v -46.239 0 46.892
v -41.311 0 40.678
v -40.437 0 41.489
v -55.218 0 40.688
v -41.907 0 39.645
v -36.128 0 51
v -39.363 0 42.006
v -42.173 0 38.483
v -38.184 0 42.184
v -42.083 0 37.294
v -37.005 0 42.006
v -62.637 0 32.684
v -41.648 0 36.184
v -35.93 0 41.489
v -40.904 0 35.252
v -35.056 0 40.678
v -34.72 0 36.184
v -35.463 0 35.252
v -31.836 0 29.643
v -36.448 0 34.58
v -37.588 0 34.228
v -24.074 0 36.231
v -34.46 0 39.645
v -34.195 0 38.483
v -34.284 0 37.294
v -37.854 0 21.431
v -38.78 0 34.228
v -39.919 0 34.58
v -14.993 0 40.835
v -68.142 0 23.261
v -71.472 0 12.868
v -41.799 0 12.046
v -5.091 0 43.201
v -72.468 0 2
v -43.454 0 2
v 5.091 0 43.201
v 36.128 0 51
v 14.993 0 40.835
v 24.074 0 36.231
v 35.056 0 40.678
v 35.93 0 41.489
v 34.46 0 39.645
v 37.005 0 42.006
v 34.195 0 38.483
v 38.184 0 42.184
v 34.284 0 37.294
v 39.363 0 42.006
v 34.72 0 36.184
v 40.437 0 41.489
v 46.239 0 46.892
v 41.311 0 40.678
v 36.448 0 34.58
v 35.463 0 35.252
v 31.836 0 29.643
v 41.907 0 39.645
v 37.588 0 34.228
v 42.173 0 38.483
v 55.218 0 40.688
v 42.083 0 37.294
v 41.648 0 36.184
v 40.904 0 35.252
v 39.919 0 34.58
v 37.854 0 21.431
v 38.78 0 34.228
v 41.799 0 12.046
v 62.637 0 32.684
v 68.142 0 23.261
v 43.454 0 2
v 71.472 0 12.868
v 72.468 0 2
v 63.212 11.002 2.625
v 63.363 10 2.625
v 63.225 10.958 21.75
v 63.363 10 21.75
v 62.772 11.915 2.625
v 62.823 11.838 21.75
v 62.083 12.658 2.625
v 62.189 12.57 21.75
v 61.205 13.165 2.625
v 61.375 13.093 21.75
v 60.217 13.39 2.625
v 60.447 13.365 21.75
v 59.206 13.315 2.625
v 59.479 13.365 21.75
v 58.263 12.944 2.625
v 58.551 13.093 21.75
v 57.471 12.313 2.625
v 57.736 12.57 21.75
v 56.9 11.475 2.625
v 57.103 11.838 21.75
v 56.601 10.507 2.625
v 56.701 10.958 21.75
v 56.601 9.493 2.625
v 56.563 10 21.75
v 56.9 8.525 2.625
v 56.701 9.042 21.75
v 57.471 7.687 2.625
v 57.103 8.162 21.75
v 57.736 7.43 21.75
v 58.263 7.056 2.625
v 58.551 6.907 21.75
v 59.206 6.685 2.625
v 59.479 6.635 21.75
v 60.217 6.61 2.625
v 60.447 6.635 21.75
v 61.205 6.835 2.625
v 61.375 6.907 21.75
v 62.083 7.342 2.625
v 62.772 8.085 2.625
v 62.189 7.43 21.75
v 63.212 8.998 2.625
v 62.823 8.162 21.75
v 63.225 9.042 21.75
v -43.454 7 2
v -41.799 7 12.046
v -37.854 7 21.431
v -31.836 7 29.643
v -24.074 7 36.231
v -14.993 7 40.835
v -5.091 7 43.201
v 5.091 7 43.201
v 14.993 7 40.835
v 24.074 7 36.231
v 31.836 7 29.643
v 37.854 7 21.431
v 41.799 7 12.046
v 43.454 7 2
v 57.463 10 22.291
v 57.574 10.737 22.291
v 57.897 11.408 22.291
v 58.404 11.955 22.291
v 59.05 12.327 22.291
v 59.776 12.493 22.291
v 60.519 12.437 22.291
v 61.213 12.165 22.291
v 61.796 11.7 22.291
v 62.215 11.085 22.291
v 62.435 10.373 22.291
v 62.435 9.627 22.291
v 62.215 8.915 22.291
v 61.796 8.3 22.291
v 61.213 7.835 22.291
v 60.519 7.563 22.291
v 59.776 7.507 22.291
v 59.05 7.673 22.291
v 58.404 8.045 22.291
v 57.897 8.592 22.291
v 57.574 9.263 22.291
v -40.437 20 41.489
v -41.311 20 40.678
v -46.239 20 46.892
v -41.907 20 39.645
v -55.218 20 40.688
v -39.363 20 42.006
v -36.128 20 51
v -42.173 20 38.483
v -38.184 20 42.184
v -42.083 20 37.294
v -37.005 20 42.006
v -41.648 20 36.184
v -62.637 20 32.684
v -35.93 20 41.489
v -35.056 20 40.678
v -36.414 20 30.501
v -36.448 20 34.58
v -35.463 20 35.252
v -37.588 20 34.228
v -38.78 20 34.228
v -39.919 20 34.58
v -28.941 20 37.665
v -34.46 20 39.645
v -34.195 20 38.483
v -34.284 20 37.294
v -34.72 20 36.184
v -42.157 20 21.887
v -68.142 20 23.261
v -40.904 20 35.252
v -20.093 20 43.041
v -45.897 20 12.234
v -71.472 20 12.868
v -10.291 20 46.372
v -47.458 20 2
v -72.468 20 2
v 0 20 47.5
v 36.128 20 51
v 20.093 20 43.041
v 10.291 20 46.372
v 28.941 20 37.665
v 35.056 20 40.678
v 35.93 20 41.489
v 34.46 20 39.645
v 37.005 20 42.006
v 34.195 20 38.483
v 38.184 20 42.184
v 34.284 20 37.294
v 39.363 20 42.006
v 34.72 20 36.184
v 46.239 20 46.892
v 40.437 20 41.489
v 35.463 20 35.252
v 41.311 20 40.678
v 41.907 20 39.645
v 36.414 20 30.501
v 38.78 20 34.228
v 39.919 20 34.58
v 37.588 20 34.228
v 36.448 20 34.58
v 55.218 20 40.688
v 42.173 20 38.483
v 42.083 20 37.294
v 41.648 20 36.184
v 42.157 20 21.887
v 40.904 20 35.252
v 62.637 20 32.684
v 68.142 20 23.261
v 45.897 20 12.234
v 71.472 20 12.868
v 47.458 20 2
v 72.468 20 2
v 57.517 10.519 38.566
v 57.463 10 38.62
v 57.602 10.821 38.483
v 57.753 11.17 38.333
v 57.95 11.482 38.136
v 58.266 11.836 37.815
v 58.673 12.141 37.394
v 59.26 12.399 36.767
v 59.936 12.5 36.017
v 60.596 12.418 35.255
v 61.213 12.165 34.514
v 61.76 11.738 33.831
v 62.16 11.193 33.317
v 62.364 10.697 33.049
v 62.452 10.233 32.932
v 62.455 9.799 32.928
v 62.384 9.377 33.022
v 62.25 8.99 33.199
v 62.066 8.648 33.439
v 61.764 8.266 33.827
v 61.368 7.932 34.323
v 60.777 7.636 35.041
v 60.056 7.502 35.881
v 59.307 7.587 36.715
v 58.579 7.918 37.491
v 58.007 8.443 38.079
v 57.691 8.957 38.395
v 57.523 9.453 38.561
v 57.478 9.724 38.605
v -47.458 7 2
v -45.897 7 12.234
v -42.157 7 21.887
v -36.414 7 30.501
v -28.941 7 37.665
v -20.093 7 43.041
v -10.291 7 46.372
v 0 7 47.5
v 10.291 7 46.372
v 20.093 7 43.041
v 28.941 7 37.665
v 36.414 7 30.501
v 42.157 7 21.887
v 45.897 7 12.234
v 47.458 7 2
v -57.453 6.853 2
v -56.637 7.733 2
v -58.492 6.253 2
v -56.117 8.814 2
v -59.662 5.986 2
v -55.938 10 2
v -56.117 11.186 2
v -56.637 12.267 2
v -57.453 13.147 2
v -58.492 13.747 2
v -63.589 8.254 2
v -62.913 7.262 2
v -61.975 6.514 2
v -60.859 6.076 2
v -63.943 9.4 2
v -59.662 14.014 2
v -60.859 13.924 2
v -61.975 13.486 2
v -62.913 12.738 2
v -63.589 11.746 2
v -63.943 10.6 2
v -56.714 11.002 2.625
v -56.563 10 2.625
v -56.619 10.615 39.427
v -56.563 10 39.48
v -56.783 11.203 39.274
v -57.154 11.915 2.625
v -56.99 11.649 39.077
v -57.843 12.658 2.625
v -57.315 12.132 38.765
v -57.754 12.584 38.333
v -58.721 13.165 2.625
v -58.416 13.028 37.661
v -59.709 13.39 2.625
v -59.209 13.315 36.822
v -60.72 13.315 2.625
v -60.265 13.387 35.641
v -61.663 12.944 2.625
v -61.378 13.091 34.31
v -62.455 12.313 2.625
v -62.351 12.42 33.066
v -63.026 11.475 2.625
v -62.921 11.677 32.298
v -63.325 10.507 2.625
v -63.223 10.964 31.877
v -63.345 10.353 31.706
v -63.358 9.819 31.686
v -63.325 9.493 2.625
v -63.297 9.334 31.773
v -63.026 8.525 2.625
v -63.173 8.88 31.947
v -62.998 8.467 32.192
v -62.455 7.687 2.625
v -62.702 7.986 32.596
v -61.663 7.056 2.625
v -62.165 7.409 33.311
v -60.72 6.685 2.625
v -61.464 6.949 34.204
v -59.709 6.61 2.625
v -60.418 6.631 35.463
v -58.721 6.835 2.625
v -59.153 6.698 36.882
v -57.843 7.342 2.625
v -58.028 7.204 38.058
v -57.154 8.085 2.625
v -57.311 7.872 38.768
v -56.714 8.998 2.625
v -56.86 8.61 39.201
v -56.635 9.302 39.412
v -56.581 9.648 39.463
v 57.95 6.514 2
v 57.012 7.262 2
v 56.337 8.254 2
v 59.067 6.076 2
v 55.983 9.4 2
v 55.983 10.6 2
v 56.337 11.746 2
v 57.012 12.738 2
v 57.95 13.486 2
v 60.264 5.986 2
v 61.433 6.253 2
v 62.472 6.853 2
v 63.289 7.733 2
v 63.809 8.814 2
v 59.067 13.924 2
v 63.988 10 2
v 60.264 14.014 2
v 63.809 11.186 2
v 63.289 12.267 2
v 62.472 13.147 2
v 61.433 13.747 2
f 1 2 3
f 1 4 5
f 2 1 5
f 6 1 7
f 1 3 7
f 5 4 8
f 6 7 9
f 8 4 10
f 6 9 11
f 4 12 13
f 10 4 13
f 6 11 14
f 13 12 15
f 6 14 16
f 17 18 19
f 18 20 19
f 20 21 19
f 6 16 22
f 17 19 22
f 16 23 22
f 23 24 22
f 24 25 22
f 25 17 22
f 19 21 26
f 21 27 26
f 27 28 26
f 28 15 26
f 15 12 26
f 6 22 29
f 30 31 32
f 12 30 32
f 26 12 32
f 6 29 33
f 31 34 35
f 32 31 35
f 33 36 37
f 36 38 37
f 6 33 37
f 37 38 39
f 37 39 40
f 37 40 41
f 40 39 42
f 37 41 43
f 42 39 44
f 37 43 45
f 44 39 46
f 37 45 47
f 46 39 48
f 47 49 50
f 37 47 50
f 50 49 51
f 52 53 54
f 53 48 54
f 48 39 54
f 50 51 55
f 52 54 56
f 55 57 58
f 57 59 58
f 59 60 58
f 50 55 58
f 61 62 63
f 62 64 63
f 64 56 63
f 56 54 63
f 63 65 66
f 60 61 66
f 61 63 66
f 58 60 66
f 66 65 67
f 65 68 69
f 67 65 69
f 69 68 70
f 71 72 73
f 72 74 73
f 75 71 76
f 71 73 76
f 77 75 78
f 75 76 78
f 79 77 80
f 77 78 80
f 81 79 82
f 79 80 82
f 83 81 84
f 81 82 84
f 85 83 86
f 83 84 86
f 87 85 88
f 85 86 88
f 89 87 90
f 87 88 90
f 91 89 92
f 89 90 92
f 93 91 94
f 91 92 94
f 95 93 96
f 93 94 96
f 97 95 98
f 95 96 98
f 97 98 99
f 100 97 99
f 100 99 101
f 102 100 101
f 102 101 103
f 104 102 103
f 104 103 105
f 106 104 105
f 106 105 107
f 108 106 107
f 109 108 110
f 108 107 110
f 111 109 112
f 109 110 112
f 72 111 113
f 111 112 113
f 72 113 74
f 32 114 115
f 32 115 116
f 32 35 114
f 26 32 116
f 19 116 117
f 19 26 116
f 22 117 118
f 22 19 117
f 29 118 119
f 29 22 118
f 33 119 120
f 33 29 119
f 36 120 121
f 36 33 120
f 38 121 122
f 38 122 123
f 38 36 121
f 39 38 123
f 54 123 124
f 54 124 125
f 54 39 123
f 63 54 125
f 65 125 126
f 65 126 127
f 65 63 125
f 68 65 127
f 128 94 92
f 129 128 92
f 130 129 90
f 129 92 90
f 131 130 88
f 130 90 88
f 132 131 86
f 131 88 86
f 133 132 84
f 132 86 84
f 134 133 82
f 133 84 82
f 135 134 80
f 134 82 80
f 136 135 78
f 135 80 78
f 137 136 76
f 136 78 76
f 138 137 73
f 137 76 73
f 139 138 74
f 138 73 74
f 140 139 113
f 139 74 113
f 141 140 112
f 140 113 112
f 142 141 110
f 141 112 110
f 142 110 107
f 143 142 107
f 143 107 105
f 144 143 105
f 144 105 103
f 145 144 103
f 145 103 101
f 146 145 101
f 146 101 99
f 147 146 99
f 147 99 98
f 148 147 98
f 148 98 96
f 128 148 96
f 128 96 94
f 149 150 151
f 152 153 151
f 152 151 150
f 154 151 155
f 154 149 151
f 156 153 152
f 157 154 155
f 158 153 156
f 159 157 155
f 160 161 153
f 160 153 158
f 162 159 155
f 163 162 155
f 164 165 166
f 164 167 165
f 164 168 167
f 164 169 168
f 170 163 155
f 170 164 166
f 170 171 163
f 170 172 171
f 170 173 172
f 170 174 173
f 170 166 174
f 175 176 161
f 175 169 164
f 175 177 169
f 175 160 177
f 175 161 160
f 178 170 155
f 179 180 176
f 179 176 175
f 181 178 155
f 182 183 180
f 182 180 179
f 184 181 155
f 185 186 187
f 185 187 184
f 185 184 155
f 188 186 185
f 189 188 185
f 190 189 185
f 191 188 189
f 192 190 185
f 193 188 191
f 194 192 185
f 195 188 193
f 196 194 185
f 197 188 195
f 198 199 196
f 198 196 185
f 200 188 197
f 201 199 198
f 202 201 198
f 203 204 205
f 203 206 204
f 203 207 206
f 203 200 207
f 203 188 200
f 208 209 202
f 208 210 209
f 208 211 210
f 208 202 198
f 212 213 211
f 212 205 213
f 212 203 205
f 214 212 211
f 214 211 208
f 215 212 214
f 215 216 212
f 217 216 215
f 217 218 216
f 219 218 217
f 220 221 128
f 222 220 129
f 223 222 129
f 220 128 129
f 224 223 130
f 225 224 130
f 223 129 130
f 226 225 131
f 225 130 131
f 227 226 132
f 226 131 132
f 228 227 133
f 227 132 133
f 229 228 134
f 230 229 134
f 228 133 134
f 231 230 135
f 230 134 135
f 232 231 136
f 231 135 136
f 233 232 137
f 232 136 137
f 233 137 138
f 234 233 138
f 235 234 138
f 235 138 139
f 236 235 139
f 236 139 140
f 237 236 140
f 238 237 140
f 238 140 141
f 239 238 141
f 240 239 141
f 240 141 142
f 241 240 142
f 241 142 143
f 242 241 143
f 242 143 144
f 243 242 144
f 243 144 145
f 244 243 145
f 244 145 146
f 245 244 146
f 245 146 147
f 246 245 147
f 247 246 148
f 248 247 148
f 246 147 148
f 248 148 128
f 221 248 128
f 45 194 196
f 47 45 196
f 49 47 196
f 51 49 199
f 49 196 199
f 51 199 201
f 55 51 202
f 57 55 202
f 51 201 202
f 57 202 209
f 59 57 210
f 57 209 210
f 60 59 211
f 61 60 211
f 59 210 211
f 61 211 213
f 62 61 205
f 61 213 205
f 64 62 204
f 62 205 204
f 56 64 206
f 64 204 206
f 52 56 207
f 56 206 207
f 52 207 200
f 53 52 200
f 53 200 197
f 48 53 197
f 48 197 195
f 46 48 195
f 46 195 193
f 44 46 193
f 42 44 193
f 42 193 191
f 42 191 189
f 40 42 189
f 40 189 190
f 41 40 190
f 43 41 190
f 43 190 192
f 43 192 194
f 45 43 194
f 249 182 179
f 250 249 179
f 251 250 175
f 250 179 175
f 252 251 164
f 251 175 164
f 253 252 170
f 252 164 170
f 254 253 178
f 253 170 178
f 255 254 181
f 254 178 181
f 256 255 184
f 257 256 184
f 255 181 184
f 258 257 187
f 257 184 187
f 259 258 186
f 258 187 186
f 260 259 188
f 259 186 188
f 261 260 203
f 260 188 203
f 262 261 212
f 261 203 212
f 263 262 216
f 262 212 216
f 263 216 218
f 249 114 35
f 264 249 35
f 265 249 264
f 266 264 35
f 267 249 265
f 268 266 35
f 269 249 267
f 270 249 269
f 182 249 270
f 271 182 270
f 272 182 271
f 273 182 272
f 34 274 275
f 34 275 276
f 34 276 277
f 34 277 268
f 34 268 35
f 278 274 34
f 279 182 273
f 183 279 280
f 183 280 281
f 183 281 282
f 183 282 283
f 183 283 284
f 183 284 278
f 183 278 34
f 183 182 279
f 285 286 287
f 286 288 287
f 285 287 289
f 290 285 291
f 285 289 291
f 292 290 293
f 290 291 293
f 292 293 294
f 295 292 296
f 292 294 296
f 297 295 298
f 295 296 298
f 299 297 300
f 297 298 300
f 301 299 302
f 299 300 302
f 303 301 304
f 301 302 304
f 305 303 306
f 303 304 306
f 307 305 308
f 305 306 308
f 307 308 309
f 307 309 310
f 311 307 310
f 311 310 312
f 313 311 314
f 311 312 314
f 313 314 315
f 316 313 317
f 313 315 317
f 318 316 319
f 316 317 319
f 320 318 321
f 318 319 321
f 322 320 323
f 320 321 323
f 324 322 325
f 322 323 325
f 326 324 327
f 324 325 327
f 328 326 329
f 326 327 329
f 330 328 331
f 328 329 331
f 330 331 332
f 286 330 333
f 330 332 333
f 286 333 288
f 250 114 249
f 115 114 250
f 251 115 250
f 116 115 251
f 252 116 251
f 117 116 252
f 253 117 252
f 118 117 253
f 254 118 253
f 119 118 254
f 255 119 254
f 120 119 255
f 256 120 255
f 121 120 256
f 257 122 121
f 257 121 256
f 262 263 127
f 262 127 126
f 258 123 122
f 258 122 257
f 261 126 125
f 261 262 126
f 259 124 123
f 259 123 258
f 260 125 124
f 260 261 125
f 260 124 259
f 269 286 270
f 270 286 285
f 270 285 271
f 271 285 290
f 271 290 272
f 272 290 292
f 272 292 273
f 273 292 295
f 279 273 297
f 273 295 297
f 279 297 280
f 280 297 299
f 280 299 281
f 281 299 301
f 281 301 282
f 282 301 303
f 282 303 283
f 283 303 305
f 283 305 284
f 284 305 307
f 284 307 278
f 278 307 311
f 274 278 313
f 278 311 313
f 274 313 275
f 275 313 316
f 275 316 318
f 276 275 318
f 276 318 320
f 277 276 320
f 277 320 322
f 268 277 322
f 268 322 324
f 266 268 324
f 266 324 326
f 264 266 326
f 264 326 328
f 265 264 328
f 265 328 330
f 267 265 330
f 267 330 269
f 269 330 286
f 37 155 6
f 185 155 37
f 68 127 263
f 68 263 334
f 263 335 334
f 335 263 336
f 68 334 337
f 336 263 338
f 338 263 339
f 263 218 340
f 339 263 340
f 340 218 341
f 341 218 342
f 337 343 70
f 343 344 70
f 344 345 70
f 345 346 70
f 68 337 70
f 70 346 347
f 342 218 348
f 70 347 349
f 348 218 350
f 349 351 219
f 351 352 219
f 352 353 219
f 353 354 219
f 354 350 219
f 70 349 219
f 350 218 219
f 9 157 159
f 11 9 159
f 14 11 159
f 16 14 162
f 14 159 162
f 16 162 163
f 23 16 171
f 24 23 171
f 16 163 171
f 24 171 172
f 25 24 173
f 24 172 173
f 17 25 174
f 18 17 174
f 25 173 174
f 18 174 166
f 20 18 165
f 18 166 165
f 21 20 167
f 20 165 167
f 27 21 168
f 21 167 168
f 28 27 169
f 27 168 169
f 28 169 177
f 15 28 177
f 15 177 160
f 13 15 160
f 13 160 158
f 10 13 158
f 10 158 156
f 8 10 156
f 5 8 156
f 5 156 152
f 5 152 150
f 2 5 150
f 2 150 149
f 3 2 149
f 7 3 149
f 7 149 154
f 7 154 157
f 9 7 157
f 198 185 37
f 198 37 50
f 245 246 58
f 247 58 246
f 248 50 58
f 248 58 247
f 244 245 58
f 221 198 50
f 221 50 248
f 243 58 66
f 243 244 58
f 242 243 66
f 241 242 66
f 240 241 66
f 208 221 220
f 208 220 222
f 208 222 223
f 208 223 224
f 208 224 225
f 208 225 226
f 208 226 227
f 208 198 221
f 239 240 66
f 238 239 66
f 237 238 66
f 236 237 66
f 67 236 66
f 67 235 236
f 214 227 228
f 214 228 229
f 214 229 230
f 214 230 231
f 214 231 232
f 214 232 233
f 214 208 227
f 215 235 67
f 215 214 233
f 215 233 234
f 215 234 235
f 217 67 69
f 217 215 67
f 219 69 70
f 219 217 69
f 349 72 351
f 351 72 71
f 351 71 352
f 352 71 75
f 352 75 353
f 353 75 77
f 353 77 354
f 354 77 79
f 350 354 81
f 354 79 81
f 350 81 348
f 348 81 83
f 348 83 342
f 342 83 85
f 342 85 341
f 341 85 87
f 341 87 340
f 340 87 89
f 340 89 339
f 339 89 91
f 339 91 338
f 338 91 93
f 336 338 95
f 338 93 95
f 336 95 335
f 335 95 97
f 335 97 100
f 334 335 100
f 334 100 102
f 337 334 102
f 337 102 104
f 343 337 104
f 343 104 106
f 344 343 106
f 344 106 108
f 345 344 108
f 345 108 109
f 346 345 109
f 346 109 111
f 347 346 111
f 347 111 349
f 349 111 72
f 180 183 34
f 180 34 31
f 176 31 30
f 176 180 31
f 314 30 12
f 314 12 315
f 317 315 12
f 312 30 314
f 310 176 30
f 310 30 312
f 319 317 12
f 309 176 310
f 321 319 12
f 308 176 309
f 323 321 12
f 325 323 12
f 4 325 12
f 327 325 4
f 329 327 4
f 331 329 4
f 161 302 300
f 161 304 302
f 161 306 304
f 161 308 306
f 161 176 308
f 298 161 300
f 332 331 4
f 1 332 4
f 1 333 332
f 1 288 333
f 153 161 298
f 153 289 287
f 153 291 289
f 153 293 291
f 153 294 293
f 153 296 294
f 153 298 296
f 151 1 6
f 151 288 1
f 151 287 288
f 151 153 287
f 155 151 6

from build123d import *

# Parameters (mm, degrees)
SKETCH1_R                   = 62.5
SKETCH1_R_2                 = 43.5
BOSS_EXTRUDE1_DEPTH         = 20
SKETCH2_R                   = 47.5
CUT_EXTRUDE1_DEPTH          = 13
SKETCH3_R                   = 4
CUT_EXTRUDE2_DEPTH          = 91.622844802
SKETCH4_W                   = 150
SKETCH4_H                   = 64.5
SKETCH4_W_2                 = 72.256487598
SKETCH4_H_2                 = 11.5
CUT_EXTRUDE3_DEPTH          = 91.622844802
BOSS_EXTRUDE4_DEPTH         = 20
SKETCH7_R                   = 2.5
CUT_EXTRUDE4_DEPTH          = 90.742875716
M8_TAPPED_HOLE1_D           = 6.8
M8_TAPPED_HOLE1_DEPTH       = 38.75
M8_TAPPED_HOLE1_CSINK_D     = 8.05
M8_TAPPED_HOLE1_CSINK_ANGLE = 90
M8_TAPPED_HOLE1_TIP         = 2.042926105
M8_TAPPED_HOLE2_D           = 6.8
M8_TAPPED_HOLE2_DEPTH       = 19.75
M8_TAPPED_HOLE2_CSINK_D     = 8.05
M8_TAPPED_HOLE2_CSINK_ANGLE = 90
M8_TAPPED_HOLE2_TIP         = 2.042926105


with BuildPart() as part:
    # Sketch1 → Boss-Extrude1 (new body)
    with BuildSketch(Plane(origin=(0, 0, 0), x_dir=(1, 0, 0), z_dir=(0, 1, 0))):
        with Locations(Location((0, 0, 0), (0, 0, 270))):
            Circle(SKETCH1_R)
        with Locations(Location((0, 0, 0), (0, 0, 270))):
            Circle(SKETCH1_R_2, mode=Mode.SUBTRACT)
    extrude(amount=BOSS_EXTRUDE1_DEPTH)

    # Sketch2 → Cut-Extrude1 (cut)
    with BuildSketch(Plane(origin=(0, 20, 0), x_dir=(1, 0, 0), z_dir=(0, 1, 0))):
        with Locations(Location((0, 0, 0), (0, 0, 270))):
            Circle(SKETCH2_R)
    extrude(amount=-CUT_EXTRUDE1_DEPTH, mode=Mode.SUBTRACT)

    # Sketch3 → Cut-Extrude2 (cut, through all)
    with BuildSketch(Plane(origin=(0, 20, 0), x_dir=(1, 0, 0), z_dir=(0, 1, 0))):
        with Locations(Location((38.183766184, 38.183766184, 0), (0, 0, 270))):
            Circle(SKETCH3_R)
        with Locations(Location((38.183766184, -38.183766184, 0), (0, 0, 270))):
            Circle(SKETCH3_R)
        with Locations(Location((-38.183766184, -38.183766184, 0), (0, 0, 270))):
            Circle(SKETCH3_R)
        with Locations(Location((-38.183766184, 38.183766184, 0), (0, 0, 270))):
            Circle(SKETCH3_R)
    extrude(amount=-CUT_EXTRUDE2_DEPTH, mode=Mode.SUBTRACT)

    # Sketch4 → Cut-Extrude3 (cut, through all)
    with BuildSketch(Plane(origin=(0, 20, 0), x_dir=(1, 0, 0), z_dir=(0, 1, 0))):
        with Locations((0, 30.25)):
            Rectangle(SKETCH4_W, SKETCH4_H)
        with Locations((0, -56.75)):
            Rectangle(SKETCH4_W_2, SKETCH4_H_2)
    extrude(amount=-CUT_EXTRUDE3_DEPTH, mode=Mode.SUBTRACT)

    # Sketch6 → Boss-Extrude4 (add, through all)
    with BuildSketch(Plane(origin=(0, 20, 0), x_dir=(1, 0, 0), z_dir=(0, 1, 0))):
        with BuildLine():
            Line((-62.467991804, -2), (-72.467991804, -2))
            ThreePointArc((-72.467991804, -2), (-62.636910051, -32.684277735), (-36.128243799, -51))
            ThreePointArc((-36.128243799, -51), (-55.050471558, -29.592154049), (-62.467991804, -2))
        make_face()
        with BuildLine():
            ThreePointArc((62.467991804, -2), (55.050471558, -29.592154049), (36.128243799, -51))
            ThreePointArc((36.128243799, -51), (62.636910051, -32.684277735), (72.467991804, -2))
            Line((72.467991804, -2), (62.467991804, -2))
        make_face()
    extrude(amount=-BOSS_EXTRUDE4_DEPTH)

    # Sketch7 → Cut-Extrude4 (cut, through all)
    with BuildSketch(Plane(origin=(0, 0, 2), x_dir=(-1, 0, 0), z_dir=(0, 0, -1))):
        with Locations((-59.962933931, 10)):
            Circle(SKETCH7_R)
    extrude(amount=-CUT_EXTRUDE4_DEPTH, mode=Mode.SUBTRACT)

    # M8 Tapped Hole1
    with Locations(Plane(origin=(-59.962933931, 10, 2), x_dir=(-1, 0, 0), z_dir=(0, 0, -1))):
        with Locations((0, 0)):
            CounterSinkHole(M8_TAPPED_HOLE1_D / 2, M8_TAPPED_HOLE1_CSINK_D / 2, depth=M8_TAPPED_HOLE1_DEPTH, counter_sink_angle=M8_TAPPED_HOLE1_CSINK_ANGLE)
            with Locations((0, 0, -(M8_TAPPED_HOLE1_DEPTH + M8_TAPPED_HOLE1_TIP / 2))):  # 118° drill point
                Cone(0, M8_TAPPED_HOLE1_D / 2, M8_TAPPED_HOLE1_TIP, mode=Mode.SUBTRACT)

    # M8 Tapped Hole2
    with Locations(Plane(origin=(59.962933931, 10, 2), x_dir=(-1, 0, 0), z_dir=(0, 0, -1))):
        with Locations((0, 0)):
            CounterSinkHole(M8_TAPPED_HOLE2_D / 2, M8_TAPPED_HOLE2_CSINK_D / 2, depth=M8_TAPPED_HOLE2_DEPTH, counter_sink_angle=M8_TAPPED_HOLE2_CSINK_ANGLE)
            with Locations((0, 0, -(M8_TAPPED_HOLE2_DEPTH + M8_TAPPED_HOLE2_TIP / 2))):  # 118° drill point
                Cone(0, M8_TAPPED_HOLE2_D / 2, M8_TAPPED_HOLE2_TIP, mode=Mode.SUBTRACT)


solid = part.part
